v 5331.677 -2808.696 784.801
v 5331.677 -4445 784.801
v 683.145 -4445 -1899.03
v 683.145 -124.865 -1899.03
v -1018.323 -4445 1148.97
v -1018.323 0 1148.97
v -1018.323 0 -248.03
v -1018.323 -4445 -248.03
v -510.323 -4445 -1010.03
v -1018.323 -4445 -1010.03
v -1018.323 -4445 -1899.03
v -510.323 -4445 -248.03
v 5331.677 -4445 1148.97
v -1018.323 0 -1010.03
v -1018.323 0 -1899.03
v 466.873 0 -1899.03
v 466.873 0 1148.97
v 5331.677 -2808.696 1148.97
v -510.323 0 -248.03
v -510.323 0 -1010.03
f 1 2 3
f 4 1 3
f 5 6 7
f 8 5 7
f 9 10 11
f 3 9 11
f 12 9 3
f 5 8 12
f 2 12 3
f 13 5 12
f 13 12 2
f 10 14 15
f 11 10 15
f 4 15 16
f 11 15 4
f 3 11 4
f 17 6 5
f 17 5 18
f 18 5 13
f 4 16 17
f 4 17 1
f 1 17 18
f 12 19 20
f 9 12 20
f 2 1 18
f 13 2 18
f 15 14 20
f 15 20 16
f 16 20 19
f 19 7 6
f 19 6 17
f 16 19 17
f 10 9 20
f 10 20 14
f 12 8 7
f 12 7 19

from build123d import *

# Parameters (mm, degrees)
F1_DEPTH = 4445
F2_W     = 4445
F2_H     = 3048
F3_DEPTH = 4445
F5_DEPTH = 4445.001
F7_DEPTH = 3048.001


with BuildPart() as f1:
    # F0 (on Front) → F1 (new body)
    with BuildSketch(Plane.XZ):
        Polygon((886.677175, 1148.970352), (-1018.322825, 1148.970352), (-1018.322825, -248.029648), (-510.322825, -248.029648), (-510.322825, -1010.029648), (-1018.322825, -1010.029648), (-1018.322825, -1899.029648), (886.677175, -1899.029648), align=None)
    extrude(amount=F1_DEPTH)

    # F2 (on face) → F3 (join)
    with BuildSketch(Plane.XZ.offset(4445)):
        with Locations((3109.177175, -375.029648)):
            Rectangle(F2_W, F2_H)
    extrude(amount=-F3_DEPTH)

    # F4 (on face) → F5 (cut, through all)
    with BuildSketch(Plane.XZ.offset(4445)):
        Polygon((5331.677175, 784.801387), (683.145463, -1899.029648), (5331.677175, -1899.029648), align=None)
    extrude(amount=-F5_DEPTH, mode=Mode.SUBTRACT)

    # F6 (on face) → F7 (cut, through all)
    with BuildSketch(Plane.XY.offset(1148.970352)):
        Polygon((5331.677175, 0), (466.873348, 0), (5331.677175, -2808.695799), align=None)
    extrude(amount=-F7_DEPTH, mode=Mode.SUBTRACT)


solid = f1.part
